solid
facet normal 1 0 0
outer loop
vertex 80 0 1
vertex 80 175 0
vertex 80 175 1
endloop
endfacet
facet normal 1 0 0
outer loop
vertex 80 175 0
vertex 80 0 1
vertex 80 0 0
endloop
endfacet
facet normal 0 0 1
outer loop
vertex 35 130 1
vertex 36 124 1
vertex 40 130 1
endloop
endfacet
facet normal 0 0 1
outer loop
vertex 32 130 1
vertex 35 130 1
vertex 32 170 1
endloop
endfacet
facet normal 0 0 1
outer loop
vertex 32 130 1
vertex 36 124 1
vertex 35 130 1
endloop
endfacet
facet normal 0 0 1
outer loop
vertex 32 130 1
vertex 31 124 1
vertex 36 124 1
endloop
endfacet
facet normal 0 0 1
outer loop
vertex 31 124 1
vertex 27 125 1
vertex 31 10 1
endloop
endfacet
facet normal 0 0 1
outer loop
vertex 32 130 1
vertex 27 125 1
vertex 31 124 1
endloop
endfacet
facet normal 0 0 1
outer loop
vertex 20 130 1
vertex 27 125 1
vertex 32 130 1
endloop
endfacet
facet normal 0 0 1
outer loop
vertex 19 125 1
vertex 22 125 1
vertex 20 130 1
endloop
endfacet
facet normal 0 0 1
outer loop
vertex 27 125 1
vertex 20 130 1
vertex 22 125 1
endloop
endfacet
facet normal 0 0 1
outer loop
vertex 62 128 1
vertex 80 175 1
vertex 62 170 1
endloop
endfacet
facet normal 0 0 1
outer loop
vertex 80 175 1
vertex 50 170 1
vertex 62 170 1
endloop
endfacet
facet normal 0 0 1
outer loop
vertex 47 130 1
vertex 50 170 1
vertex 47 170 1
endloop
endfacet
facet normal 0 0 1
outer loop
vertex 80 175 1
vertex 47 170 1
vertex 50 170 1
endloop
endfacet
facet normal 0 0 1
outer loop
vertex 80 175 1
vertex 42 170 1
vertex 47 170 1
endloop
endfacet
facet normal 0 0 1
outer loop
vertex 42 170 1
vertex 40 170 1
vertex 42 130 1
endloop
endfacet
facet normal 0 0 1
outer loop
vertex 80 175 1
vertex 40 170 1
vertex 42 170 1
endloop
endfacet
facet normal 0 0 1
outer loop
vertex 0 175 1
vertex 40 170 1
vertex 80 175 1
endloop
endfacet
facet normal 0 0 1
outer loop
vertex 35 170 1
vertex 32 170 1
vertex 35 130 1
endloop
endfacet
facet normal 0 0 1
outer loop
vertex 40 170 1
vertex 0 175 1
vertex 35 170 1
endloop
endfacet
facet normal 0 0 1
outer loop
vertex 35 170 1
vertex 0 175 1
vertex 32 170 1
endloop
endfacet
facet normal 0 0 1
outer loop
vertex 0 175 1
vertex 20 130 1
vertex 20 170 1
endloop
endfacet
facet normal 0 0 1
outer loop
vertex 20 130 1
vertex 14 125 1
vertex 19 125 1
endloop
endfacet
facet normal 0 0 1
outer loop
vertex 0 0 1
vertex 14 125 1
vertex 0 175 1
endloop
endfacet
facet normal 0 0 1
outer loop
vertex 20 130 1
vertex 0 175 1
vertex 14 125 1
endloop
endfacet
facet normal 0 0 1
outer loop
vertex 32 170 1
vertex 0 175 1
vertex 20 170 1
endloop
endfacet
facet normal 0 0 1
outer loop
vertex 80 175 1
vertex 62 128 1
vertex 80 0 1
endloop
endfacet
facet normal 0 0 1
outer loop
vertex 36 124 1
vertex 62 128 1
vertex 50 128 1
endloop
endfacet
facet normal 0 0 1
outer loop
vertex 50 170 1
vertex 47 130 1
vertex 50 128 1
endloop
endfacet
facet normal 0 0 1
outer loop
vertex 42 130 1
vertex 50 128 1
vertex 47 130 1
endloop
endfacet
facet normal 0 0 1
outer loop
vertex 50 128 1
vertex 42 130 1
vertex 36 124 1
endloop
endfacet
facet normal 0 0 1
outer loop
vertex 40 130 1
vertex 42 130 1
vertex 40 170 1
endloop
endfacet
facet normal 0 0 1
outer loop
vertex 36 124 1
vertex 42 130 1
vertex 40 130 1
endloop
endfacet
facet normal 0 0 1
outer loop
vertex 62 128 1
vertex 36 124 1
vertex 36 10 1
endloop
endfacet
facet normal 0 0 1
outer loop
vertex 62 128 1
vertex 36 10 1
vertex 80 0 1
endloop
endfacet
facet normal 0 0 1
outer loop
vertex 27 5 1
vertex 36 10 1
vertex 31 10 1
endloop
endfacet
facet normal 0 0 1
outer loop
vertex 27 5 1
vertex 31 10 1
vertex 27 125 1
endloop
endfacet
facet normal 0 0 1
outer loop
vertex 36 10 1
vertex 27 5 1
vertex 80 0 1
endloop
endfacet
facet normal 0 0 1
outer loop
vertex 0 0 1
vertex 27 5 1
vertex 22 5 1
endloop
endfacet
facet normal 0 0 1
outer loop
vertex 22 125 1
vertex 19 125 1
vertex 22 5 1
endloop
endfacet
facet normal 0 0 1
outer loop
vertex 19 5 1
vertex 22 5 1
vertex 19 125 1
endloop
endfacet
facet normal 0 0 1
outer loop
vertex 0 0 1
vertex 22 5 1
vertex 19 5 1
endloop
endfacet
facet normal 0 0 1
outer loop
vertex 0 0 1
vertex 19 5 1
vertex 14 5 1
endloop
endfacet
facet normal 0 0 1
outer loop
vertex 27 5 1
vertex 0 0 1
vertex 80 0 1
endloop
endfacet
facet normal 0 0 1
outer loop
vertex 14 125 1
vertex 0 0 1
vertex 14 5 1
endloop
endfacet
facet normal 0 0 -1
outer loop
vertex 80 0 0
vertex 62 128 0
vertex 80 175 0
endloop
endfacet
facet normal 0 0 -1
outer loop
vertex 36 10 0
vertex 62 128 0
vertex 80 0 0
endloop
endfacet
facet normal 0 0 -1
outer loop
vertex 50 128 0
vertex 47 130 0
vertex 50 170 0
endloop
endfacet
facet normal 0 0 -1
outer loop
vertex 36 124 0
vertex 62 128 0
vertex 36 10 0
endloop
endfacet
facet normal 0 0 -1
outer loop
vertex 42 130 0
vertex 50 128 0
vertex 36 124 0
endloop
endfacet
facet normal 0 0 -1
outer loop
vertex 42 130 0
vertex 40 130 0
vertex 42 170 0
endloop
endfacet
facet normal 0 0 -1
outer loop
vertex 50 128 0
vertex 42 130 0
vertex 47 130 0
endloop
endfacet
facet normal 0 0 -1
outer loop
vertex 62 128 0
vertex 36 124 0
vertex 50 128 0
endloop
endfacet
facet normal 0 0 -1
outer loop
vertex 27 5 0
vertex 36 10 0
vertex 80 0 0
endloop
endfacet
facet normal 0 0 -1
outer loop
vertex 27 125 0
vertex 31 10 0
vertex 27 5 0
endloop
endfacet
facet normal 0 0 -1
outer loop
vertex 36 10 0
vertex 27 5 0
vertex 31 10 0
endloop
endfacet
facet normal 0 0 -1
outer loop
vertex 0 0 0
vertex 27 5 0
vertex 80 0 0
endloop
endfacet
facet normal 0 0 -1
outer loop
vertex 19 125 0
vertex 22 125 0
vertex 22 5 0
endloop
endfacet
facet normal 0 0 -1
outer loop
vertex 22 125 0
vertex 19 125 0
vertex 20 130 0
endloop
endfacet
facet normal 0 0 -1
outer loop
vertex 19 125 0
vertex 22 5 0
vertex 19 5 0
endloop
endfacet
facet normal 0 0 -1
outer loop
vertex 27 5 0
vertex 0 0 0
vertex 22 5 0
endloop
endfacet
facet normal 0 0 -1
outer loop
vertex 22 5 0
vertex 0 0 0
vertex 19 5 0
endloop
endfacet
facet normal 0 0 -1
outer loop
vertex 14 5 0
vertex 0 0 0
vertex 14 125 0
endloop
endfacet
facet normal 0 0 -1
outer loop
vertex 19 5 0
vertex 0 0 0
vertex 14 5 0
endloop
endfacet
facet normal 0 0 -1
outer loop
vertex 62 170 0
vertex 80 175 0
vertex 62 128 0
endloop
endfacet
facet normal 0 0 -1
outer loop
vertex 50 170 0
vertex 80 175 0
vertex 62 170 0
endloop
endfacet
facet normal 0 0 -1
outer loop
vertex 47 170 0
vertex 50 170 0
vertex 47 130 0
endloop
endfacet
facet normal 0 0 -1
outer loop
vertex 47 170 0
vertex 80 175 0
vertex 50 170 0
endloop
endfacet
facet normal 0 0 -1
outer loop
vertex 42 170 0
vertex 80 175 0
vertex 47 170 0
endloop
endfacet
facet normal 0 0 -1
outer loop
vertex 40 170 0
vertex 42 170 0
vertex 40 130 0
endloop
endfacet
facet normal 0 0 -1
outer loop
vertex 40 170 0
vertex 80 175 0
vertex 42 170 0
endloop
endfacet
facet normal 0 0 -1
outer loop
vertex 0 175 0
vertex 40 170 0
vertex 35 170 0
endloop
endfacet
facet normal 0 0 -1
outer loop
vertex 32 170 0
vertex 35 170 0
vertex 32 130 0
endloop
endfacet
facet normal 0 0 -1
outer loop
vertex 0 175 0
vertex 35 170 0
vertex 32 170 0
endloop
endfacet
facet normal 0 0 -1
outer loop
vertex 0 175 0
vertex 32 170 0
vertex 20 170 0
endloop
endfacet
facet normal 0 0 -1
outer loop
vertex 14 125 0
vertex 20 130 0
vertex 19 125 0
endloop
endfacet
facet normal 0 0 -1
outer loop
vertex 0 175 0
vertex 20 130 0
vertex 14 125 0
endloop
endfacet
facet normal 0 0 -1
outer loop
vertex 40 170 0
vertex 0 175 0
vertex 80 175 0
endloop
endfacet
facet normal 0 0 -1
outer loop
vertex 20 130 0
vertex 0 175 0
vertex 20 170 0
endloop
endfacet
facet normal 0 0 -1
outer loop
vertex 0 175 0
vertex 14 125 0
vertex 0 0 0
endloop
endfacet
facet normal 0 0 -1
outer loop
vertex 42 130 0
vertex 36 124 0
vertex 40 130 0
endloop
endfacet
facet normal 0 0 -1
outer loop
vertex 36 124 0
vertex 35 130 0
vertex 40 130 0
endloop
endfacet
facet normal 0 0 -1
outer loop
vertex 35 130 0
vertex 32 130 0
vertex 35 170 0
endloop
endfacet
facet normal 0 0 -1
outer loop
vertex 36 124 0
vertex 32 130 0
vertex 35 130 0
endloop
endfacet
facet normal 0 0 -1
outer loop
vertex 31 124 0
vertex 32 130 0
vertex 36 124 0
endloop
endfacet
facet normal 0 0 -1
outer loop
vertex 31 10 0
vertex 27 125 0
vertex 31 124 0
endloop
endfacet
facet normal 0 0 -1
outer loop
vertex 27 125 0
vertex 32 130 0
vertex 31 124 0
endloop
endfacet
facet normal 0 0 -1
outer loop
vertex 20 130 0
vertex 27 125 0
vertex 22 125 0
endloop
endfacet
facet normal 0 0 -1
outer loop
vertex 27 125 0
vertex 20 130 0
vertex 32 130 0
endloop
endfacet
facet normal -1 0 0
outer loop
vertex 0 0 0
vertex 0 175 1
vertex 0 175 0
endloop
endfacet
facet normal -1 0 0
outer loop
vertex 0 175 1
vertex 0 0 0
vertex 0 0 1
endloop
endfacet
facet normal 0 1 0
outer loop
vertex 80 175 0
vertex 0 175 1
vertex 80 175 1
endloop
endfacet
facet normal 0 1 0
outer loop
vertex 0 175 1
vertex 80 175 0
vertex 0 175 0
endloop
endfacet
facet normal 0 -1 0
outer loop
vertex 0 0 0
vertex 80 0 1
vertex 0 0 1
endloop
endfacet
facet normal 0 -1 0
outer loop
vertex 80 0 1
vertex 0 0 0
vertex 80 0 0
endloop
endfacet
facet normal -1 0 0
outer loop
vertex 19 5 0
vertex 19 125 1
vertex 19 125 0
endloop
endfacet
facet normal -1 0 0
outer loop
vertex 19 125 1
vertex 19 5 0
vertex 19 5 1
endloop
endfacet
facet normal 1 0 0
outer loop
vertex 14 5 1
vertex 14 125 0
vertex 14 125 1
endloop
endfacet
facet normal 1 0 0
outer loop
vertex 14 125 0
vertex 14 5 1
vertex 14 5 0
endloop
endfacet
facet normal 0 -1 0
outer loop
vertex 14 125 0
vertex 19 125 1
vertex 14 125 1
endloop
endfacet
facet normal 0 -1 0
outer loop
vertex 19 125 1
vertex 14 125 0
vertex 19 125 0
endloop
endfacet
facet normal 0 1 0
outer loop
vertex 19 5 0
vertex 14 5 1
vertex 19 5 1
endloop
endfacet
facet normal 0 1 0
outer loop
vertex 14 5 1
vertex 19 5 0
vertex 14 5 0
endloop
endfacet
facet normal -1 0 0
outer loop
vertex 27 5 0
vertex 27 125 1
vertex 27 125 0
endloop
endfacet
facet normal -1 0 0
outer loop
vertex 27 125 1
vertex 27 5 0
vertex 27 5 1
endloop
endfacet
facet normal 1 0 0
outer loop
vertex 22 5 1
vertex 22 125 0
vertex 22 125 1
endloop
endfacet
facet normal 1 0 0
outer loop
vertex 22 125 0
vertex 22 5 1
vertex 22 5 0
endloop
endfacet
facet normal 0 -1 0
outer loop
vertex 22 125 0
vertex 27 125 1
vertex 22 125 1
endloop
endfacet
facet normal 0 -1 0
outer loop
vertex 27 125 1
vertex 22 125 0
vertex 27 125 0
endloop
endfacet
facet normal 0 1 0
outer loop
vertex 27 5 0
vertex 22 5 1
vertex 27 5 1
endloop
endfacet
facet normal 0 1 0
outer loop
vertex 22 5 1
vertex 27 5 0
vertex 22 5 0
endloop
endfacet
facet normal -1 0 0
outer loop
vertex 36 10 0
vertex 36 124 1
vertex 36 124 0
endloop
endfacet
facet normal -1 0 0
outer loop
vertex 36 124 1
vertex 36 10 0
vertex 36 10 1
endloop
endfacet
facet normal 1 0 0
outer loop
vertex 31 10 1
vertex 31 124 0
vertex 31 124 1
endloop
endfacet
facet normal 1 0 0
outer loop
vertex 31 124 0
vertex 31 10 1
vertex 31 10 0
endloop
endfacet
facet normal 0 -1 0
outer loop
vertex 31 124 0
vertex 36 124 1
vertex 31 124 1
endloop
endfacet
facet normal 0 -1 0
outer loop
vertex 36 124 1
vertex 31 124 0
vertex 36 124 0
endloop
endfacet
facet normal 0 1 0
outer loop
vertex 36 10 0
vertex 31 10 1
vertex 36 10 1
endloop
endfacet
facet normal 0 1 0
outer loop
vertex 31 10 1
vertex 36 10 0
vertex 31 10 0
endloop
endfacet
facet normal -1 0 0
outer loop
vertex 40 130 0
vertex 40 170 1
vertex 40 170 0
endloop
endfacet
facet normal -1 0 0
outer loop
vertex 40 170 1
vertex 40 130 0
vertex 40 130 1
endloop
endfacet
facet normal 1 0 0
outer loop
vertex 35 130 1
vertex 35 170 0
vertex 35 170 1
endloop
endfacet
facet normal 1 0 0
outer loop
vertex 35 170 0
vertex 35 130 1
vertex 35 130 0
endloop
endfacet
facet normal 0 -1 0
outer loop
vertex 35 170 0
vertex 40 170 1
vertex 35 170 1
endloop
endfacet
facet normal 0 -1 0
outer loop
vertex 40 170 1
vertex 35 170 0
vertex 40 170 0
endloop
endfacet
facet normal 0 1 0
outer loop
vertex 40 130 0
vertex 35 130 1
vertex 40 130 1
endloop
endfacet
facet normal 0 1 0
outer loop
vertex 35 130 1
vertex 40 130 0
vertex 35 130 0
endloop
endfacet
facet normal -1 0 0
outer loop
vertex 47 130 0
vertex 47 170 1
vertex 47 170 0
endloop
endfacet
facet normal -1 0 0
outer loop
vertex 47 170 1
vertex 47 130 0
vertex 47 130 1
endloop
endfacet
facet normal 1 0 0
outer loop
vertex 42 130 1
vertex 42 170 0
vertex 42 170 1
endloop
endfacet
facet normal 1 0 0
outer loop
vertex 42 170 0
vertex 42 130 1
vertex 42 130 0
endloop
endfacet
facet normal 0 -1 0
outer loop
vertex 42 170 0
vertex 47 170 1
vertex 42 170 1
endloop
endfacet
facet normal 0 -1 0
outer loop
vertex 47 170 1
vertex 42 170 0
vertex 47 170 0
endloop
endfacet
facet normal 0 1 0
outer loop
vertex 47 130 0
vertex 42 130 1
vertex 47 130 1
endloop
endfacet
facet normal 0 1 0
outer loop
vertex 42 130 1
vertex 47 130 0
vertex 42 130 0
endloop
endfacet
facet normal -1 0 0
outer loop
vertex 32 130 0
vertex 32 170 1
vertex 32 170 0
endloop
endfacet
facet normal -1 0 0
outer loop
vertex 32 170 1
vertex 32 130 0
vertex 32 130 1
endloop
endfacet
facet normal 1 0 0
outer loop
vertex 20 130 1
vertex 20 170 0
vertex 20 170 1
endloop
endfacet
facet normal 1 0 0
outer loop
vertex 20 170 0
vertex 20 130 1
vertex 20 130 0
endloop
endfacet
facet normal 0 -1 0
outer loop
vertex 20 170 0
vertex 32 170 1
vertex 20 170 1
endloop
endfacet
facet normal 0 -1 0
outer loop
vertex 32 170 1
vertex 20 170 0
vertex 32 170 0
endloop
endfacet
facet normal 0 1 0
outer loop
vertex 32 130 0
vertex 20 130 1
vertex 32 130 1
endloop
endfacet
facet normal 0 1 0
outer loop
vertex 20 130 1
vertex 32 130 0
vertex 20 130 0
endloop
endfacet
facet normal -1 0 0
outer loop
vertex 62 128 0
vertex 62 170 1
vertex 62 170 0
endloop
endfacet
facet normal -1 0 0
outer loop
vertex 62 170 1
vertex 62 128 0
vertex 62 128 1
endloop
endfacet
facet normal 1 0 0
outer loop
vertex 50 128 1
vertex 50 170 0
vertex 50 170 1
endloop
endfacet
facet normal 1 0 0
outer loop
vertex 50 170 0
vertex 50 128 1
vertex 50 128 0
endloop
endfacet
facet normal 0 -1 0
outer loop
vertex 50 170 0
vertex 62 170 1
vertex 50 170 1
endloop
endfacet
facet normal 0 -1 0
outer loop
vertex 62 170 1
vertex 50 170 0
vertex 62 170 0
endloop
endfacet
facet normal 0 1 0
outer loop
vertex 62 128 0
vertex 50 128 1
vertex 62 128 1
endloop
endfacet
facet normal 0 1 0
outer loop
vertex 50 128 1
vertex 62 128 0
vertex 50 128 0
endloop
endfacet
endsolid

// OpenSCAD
// guide cheque LCL version 0 by GAU for SAAAIS 34&30 //

difference()
	{


// plateau
cube([80,175,1]);

// case 1 montant 1ere ligne
translate([14,5,-0.5])
cube([5,120,4]);

// case 2 montant 2eme ligne
translate([22,5,-0.5])
cube([5,120,4]);

// case 3 ordre
translate([31,10,-0.5])
cube([5,114,4]);

// case 4 fais à
translate([35,130,-0.5])
cube([5,40,4]);

// case 5 fais le
translate([42,130,-0.5])
cube([5,40,4]);

// case 6 montant chiffres
translate([20,130,-0.5])
cube([12,40,4]);

// case 5 signature
translate([50,128,-0.5])
cube([12,42,4]);
}
